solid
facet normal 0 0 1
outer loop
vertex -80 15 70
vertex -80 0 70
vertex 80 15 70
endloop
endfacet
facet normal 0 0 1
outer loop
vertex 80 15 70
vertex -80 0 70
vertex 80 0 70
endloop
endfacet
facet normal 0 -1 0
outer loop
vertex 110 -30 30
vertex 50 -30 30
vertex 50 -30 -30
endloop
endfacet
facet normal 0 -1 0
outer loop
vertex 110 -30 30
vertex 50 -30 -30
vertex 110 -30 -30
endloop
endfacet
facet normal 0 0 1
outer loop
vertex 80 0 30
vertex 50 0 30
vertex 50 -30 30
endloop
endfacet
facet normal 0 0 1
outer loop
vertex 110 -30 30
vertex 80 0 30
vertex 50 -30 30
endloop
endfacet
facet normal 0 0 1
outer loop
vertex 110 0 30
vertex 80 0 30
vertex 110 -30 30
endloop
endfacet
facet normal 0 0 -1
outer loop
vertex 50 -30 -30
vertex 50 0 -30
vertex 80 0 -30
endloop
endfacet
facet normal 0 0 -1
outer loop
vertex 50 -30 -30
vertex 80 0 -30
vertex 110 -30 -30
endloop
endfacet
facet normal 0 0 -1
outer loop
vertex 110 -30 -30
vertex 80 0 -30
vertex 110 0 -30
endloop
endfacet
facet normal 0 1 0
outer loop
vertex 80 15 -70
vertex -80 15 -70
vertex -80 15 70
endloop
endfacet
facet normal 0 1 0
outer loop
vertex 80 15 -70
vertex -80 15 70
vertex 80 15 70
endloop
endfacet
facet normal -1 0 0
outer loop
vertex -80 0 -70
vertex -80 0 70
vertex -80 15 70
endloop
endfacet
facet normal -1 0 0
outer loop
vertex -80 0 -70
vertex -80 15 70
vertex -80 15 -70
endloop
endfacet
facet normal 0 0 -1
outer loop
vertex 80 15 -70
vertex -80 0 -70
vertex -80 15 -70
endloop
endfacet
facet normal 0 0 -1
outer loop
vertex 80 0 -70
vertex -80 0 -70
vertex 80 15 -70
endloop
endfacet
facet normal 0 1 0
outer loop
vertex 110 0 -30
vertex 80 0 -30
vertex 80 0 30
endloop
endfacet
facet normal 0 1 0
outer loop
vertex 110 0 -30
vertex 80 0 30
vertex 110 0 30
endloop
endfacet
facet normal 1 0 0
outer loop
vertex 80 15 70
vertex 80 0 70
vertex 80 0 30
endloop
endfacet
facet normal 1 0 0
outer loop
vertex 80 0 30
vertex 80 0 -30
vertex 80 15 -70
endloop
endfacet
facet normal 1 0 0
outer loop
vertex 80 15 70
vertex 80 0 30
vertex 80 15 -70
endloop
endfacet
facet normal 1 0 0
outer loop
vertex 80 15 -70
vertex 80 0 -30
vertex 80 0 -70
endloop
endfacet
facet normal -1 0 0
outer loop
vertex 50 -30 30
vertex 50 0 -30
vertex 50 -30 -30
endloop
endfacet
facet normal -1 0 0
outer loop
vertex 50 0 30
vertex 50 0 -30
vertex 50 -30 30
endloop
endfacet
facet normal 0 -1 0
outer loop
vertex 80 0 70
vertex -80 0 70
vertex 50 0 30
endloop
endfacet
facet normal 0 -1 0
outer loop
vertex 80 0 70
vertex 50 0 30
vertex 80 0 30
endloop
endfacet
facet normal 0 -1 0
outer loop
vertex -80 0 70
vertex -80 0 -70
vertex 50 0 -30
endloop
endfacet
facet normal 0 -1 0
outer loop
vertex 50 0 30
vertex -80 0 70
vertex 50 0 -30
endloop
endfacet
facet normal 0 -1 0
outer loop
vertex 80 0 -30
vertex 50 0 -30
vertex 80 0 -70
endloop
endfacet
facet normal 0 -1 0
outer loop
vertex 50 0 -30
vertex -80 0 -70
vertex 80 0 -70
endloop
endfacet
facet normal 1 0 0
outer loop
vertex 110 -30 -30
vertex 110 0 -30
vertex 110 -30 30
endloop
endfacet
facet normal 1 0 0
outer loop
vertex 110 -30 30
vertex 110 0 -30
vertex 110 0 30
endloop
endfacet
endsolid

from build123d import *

# Parameters (mm, degrees)
SKETCH_1_W      = 160
SKETCH_1_H      = 140
EXTRUDE_1_DEPTH = 15
SKETCH_3_W      = 60
SKETCH_3_H      = 60
EXTRUDE_2_DEPTH = 30


with BuildPart() as part:
    # 草图1 → 凸台-拉伸1 (new body)
    with BuildSketch(Plane(origin=(0, 0, 0), x_dir=(1, 0, 0), z_dir=(0, 1, 0))):
        Rectangle(SKETCH_1_W, SKETCH_1_H)
    extrude(amount=EXTRUDE_1_DEPTH)

    # 草图3 → 凸台-拉伸2 (add)
    with BuildSketch(Plane.XZ):
        with Locations((80, 0)):
            Rectangle(SKETCH_3_W, SKETCH_3_H)
    extrude(amount=EXTRUDE_2_DEPTH)


solid = part.part
